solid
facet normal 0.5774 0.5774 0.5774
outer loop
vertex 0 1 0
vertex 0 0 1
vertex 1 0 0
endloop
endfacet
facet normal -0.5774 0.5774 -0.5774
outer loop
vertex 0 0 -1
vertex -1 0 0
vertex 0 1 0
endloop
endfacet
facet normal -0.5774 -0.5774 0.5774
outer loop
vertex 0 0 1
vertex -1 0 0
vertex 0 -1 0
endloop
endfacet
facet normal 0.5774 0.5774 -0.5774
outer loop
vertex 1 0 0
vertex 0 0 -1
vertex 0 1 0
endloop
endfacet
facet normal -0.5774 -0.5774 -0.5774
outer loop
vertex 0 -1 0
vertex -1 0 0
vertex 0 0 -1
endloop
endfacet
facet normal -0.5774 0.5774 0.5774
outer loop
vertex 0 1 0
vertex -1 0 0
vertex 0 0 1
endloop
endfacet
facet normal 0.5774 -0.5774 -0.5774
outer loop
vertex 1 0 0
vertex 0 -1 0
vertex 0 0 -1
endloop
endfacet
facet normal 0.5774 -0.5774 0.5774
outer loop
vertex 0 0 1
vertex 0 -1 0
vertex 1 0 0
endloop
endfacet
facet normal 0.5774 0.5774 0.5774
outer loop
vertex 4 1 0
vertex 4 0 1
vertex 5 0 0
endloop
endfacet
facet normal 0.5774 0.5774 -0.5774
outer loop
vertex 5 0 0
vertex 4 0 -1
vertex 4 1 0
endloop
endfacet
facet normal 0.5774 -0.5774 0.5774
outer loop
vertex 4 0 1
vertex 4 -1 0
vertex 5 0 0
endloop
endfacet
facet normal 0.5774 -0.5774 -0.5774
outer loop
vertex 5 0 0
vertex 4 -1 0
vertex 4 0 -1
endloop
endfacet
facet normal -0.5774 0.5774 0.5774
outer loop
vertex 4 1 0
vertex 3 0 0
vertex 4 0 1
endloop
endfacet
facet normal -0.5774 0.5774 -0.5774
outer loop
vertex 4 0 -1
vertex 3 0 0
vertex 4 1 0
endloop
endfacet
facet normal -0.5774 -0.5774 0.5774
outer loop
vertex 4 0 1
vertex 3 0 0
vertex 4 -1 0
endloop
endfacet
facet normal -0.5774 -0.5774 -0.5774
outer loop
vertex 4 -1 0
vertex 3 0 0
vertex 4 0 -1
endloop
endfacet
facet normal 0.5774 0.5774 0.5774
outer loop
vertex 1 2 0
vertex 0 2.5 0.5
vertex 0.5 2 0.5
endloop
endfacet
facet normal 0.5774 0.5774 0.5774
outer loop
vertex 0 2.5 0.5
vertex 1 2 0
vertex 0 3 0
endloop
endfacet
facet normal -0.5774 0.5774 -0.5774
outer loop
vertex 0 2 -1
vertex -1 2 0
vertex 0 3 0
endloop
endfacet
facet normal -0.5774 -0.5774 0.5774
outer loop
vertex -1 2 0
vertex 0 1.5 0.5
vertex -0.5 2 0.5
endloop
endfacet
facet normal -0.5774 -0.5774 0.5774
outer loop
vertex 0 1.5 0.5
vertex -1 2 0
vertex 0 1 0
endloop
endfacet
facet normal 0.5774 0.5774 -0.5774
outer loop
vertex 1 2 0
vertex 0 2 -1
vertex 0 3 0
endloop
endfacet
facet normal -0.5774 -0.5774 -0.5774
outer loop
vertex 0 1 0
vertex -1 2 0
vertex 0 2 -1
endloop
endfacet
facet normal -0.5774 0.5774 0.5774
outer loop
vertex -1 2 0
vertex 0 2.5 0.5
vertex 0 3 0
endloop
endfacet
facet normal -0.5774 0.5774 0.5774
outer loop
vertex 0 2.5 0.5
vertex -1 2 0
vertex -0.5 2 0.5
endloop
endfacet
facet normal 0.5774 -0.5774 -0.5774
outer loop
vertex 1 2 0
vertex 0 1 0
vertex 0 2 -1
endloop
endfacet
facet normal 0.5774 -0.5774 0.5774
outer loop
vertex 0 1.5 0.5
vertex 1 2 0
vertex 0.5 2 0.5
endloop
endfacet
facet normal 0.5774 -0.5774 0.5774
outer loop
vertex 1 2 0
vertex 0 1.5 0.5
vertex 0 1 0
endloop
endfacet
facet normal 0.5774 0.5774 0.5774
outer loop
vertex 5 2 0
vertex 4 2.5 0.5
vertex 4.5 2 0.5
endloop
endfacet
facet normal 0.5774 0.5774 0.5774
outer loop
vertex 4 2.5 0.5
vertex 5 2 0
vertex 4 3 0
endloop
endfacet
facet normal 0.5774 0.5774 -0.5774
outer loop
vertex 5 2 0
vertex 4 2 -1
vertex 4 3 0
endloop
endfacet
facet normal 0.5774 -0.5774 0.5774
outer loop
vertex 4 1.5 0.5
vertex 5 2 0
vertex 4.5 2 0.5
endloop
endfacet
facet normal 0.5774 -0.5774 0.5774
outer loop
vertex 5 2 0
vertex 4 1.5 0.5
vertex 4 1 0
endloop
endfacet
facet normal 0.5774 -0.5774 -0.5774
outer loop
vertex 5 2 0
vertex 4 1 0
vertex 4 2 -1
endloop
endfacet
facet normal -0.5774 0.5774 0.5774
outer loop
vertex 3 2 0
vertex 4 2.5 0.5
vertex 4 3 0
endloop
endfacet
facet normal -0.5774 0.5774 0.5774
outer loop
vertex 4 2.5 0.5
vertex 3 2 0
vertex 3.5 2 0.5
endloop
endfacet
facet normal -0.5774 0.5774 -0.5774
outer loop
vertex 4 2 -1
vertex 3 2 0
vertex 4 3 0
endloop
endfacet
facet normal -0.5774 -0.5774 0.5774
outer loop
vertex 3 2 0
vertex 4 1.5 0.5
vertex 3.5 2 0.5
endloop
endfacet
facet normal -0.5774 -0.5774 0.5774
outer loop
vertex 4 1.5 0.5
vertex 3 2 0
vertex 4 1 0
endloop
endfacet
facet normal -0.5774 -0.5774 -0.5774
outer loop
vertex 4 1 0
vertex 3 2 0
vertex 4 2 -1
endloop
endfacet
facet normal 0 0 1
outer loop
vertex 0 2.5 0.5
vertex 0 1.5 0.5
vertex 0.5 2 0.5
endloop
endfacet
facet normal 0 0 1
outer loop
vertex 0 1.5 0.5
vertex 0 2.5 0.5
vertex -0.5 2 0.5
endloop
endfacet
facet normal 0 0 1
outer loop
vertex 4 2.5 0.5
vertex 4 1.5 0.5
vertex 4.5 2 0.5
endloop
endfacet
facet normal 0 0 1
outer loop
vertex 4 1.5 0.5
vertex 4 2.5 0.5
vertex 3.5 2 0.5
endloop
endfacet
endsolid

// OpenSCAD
module polyhedrons() {
 polyhedron(points = [[1,0,0],[-1,0,0],[0,1,0],[0,-1,0],[0,0,1],[0,0,-1]],
            triangles = [[0,4,2],[0,2,5],[0,3,4],[0,5,3],[1,2,4],[1,5,2],[1,4,3], [1,3,5]]);

 // One face flipped
 translate([2,0,0])
  polyhedron(points = [[1,0,0],[-1,0,0],[0,1,0],[0,-1,0],[0,0,1],[0,0,-1]],
            triangles = [[0,4,2],[0,2,5],[0,3,4],[0,5,3],[1,2,4],[1,5,2],[1,3,4], [1,3,5]]);

 // All faces flipped
 translate([4,0,0])
  polyhedron(points = [[1,0,0],[-1,0,0],[0,1,0],[0,-1,0],[0,0,1],[0,0,-1]],
            triangles = [[0,2,4],[0,5,2],[0,4,3],[0,3,5],[1,4,2],[1,2,5],[1,3,4], [1,5,3]]);
}

polyhedrons();
translate([0,2,0]) difference() {
  polyhedrons();
  translate([3,0,2]) cube([8,3,3], center=true);
}

// don't crash (issue #703)
polyhedron(points = undef, triangles = [[1, 2, 3]]);
polyhedron(points = [[0,0,0],[1,1,1]], triangles = undef);
// More malformed polyhedrons
polyhedron();
polyhedron(points=[0], faces = [[0]]);
polyhedron(points=[[1,0,0],[-1,0,0],[0,1,0],[0,-1,0]], faces = [[0,1,4]]);
polyhedron(points=[[1,0,0],[-1,0,0]], faces = [[]]);
polyhedron(points=[[1,0,0],[-1,0,0]], faces = [[0]]);
polyhedron(points=[[1,0,0],[-1,0,0]], faces = [[0,1]]);
polyhedron(points=[[1,0,0],[-1,0,0]], faces = [[0,1,1]]);
polyhedron(points=[[1,0,0],[-1,0,0]], faces = [[0,1,0]]);
polyhedron(points=[[1,0,0],[0,0,0],[-0.1,1,0],[0,2,0]],faces=[[0,1,3,2]]);
